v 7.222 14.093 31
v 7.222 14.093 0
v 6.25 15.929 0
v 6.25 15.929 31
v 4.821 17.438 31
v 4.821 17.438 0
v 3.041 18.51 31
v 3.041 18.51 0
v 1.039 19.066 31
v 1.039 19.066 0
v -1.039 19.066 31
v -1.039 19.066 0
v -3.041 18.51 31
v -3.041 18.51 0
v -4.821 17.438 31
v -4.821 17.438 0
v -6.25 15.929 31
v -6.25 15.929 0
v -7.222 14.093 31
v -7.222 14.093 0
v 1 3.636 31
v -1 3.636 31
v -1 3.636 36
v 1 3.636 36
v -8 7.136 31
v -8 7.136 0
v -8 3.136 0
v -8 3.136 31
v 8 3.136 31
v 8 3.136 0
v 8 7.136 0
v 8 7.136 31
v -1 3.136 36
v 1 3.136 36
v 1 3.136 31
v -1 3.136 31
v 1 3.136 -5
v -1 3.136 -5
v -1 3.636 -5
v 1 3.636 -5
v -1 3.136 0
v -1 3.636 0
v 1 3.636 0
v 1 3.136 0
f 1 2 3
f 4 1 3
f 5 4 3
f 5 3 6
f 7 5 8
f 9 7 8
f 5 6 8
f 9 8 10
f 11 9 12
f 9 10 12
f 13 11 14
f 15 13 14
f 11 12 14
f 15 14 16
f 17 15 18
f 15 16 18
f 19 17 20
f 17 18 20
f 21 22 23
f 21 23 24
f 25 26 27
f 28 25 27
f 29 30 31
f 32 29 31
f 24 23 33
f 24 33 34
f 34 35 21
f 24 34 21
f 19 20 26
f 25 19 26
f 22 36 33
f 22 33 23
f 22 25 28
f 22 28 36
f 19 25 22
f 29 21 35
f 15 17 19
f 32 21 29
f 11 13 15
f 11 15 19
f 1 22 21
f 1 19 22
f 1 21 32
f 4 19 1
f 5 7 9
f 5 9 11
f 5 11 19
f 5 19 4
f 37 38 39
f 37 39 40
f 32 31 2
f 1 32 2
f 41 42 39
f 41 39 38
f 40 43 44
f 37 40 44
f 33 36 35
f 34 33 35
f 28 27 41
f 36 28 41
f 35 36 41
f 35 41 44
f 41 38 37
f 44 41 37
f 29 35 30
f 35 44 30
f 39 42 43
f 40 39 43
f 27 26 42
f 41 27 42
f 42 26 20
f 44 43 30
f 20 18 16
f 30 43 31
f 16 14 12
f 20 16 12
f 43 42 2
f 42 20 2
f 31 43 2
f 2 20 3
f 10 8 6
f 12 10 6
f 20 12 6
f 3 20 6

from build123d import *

# Parameters (mm, degrees)
F1_DEPTH = 31
F2_W     = 2
F2_H     = 0.5
F3_DEPTH = 5
F4_W     = 2
F4_H     = 0.5
F5_DEPTH = 5


with BuildPart() as f1:
    # F0 (on Top) → F1 (new body)
    with BuildSketch(Plane.XY):
        with BuildLine():
            Line((-8, 3.136335), (8, 3.136335))
            Line((8, 3.136335), (8, 7.136335))
            Line((8, 7.136335), (7.222222, 14.092991))
            ThreePointArc((7.222222, 14.092991), (0, 19.136335), (-7.222222, 14.092991))
            Line((-7.222222, 14.092991), (-8, 7.136335))
            Line((-8, 7.136335), (-8, 3.136335))
        make_face()
    extrude(amount=F1_DEPTH)

    # F2 (on face) → F3 (join)
    with BuildSketch(Plane.XY.offset(31)):
        with Locations((0, 3.386335)):
            Rectangle(F2_W, F2_H)
    extrude(amount=F3_DEPTH)

    # F4 (on face) → F5 (join)
    with BuildSketch(Plane(origin=(0, 0, 0), x_dir=(1, 0, 0), z_dir=(0, 0, -1))):
        with Locations((0, -3.386335)):
            Rectangle(F4_W, F4_H)
    extrude(amount=F5_DEPTH)


solid = f1.part
